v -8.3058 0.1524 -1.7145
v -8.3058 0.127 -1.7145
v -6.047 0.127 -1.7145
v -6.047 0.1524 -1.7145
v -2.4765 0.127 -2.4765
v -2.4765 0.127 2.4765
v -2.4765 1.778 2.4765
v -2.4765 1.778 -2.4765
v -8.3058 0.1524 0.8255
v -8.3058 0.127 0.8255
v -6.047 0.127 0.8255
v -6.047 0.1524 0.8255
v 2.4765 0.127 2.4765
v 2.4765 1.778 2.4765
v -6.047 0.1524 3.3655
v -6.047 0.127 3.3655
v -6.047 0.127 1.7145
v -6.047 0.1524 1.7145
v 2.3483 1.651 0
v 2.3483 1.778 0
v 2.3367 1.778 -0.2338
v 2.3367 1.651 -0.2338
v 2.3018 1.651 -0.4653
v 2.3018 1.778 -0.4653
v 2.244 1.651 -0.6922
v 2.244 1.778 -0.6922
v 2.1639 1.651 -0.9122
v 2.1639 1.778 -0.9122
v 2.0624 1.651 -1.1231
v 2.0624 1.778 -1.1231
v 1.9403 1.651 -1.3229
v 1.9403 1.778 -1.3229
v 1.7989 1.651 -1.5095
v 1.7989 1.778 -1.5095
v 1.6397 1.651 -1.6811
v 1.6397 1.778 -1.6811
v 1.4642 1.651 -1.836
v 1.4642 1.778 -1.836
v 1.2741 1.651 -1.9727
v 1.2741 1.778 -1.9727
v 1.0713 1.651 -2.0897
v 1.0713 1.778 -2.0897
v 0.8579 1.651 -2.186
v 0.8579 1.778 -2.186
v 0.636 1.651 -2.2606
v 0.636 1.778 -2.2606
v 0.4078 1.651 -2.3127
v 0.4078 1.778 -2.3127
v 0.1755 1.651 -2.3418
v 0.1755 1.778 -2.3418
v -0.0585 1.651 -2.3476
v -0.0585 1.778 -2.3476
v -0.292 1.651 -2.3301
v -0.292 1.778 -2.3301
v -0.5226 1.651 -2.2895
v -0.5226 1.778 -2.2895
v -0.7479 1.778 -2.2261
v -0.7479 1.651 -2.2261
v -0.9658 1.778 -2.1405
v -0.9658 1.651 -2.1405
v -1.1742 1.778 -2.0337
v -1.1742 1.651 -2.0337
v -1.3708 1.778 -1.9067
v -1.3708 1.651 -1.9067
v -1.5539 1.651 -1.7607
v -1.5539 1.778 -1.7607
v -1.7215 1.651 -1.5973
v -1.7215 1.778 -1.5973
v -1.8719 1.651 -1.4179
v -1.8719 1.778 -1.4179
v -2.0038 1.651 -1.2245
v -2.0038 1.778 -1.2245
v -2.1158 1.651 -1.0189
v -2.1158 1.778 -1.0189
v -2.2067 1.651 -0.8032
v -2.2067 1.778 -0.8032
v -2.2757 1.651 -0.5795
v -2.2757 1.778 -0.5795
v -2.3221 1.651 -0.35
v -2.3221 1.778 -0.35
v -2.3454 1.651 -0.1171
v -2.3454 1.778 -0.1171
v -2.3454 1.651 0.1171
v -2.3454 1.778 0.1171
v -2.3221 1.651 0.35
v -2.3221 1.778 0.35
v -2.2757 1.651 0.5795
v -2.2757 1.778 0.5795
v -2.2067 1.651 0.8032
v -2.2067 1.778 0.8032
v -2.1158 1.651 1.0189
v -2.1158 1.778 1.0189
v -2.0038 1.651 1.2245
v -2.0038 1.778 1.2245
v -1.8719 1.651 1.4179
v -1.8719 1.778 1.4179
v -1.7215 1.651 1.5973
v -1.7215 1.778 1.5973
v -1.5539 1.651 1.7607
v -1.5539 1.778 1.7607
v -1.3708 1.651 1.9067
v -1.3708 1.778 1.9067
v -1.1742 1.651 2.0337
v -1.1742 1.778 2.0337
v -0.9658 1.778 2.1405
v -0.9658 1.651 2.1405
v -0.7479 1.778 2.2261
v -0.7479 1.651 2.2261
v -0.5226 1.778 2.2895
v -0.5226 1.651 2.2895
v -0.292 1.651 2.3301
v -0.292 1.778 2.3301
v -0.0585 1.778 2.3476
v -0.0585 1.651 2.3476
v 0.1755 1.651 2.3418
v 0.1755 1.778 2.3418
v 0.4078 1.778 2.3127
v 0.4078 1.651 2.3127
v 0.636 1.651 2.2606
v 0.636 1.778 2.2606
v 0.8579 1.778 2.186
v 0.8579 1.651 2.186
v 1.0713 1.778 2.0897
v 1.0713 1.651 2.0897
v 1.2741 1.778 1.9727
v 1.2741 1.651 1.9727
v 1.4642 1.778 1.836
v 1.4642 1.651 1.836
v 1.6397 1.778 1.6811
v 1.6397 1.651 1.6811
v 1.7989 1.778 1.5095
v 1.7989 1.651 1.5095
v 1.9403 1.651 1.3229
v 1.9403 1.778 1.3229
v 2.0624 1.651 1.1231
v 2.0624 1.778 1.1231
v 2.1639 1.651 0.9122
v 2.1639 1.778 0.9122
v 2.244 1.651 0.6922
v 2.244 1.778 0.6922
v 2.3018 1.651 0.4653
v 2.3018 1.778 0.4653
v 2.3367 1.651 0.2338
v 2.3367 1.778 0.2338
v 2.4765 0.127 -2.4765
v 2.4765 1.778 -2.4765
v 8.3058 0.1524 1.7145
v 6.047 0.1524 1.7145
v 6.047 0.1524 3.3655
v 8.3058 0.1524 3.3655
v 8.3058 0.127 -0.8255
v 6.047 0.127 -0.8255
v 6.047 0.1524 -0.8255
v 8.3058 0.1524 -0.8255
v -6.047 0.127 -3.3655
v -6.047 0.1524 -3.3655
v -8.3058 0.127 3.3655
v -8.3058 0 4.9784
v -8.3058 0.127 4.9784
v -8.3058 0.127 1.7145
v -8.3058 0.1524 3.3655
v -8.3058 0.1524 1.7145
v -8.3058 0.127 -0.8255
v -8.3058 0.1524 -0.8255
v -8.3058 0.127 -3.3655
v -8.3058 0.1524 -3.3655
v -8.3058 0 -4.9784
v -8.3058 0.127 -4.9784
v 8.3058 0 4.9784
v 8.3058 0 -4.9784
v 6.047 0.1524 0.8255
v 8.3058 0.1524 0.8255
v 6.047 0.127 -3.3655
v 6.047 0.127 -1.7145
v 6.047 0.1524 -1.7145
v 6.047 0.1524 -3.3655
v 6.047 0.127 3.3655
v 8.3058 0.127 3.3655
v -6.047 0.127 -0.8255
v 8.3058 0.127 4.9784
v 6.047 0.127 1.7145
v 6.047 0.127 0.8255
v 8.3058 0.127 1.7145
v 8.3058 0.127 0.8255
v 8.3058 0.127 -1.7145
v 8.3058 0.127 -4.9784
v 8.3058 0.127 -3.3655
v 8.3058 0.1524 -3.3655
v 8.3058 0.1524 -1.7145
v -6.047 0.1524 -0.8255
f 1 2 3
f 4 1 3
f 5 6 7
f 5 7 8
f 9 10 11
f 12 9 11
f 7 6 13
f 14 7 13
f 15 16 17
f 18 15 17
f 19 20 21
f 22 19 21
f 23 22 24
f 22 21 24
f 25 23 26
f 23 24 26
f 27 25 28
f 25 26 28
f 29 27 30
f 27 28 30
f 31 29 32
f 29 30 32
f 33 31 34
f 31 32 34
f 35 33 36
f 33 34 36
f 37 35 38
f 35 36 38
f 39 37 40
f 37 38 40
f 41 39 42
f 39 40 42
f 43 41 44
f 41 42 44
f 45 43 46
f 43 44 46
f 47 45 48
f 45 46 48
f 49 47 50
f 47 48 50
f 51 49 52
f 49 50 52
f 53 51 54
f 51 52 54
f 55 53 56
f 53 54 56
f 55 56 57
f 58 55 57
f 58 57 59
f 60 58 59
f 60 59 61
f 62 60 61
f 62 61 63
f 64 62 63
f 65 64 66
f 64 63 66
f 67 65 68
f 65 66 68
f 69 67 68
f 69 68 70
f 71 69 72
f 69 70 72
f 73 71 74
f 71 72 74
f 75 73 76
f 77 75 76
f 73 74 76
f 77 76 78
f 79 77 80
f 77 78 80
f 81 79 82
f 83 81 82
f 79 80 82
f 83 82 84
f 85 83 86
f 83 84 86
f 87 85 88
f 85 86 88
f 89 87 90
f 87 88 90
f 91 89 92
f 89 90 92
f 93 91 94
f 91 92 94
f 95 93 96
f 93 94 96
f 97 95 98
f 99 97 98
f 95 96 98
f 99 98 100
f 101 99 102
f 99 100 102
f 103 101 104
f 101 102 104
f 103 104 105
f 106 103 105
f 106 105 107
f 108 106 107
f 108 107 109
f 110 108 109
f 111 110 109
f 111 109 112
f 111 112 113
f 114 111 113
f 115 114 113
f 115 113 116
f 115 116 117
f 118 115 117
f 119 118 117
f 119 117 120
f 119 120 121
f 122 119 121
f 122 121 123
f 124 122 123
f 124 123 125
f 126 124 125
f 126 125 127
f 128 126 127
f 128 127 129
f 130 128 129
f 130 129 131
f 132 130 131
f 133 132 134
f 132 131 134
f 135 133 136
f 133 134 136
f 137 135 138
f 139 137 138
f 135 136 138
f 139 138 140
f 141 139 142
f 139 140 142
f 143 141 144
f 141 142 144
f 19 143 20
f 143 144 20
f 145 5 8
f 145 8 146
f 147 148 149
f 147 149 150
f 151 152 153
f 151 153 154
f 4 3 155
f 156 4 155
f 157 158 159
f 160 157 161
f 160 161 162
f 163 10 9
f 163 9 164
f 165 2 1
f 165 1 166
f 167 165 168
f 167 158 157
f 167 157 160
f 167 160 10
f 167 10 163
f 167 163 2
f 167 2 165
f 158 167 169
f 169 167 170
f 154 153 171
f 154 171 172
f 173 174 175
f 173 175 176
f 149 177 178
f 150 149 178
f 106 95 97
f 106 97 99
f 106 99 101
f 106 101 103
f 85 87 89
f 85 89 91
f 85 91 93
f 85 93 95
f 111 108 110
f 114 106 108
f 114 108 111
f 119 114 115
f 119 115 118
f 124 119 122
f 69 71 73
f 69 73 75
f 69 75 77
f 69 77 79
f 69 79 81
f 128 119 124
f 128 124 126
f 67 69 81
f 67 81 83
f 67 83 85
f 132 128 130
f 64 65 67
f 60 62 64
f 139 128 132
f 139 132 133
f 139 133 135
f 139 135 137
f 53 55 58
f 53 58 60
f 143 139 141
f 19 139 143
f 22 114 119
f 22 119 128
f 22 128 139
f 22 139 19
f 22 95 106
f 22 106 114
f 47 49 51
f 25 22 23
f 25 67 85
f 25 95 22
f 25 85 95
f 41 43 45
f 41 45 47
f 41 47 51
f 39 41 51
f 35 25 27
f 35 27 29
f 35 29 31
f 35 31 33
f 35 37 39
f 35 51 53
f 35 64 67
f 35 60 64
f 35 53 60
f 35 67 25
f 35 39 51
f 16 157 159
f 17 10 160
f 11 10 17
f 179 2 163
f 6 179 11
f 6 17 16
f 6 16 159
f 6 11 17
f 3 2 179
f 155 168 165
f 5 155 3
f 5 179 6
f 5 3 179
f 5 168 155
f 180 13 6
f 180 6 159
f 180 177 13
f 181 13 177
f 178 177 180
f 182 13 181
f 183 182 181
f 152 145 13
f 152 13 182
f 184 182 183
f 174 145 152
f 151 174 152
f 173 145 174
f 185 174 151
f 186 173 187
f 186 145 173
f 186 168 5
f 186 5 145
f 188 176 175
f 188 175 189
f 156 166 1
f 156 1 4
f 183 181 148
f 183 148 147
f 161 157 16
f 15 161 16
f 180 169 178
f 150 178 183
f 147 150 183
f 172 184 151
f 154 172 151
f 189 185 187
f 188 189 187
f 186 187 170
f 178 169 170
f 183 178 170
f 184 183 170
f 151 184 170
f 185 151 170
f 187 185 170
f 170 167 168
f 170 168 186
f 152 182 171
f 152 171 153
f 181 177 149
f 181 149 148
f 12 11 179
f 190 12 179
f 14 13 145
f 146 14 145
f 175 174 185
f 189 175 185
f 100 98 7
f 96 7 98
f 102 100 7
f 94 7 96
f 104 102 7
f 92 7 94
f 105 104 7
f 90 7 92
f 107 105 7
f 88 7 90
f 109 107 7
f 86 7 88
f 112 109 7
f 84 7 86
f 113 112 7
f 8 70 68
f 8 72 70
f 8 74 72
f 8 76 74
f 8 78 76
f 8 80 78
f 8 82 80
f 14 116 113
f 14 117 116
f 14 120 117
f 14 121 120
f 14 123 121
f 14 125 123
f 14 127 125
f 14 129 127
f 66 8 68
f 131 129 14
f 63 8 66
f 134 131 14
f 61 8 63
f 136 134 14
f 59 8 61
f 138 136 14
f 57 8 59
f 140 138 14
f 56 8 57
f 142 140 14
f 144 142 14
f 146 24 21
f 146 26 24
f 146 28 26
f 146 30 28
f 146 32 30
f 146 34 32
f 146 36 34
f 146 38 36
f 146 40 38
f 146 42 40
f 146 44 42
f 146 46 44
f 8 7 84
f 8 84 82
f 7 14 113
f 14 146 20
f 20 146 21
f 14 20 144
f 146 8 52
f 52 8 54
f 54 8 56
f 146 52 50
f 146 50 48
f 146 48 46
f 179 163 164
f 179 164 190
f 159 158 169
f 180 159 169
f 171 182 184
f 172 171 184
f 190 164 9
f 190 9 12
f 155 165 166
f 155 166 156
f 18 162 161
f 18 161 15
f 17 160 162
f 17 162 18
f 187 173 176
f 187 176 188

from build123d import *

# Parameters (mm, degrees)
SKETCH1_W           = 16.6116
SKETCH1_H           = 9.9568
BOSS_EXTRUDE1_DEPTH = 0.127
SKETCH3_W           = 4.953
SKETCH3_H           = 4.953
BOSS_EXTRUDE3_DEPTH = 1.651
SKETCH4_W           = 2.258810151
SKETCH4_H           = 1.651
BOSS_EXTRUDE4_DEPTH = 0.0254
SKETCH5_R           = 2.348345572
CUT_EXTRUDE1_DEPTH  = 0.127


with BuildPart() as part:
    # Sketch1 → Boss-Extrude1 (new body)
    with BuildSketch(Plane(origin=(0, 0, 0), x_dir=(1, 0, 0), z_dir=(0, 1, 0))):
        Rectangle(SKETCH1_W, SKETCH1_H)
    extrude(amount=BOSS_EXTRUDE1_DEPTH)

    # Sketch3 → Boss-Extrude3 (add)
    with BuildSketch(Plane(origin=(0, 0.127, 0), x_dir=(1, 0, 0), z_dir=(0, 1, 0))):
        Rectangle(SKETCH3_W, SKETCH3_H)
    extrude(amount=BOSS_EXTRUDE3_DEPTH)

    # Sketch4 → Boss-Extrude4 (add)
    with BuildSketch(Plane(origin=(0, 0.127, 0), x_dir=(1, 0, 0), z_dir=(0, 1, 0))):
        with Locations((-7.176394925, 0)):
            Rectangle(SKETCH4_W, SKETCH4_H)
        with Locations((-7.176394925, 2.54)):
            Rectangle(SKETCH4_W, SKETCH4_H)
        with Locations((-7.176394925, -2.54)):
            Rectangle(SKETCH4_W, SKETCH4_H)
        with Locations((7.176394925, -2.54)):
            Rectangle(SKETCH4_W, SKETCH4_H)
        with Locations((7.176394925, 0)):
            Rectangle(SKETCH4_W, SKETCH4_H)
        with Locations((7.176394925, 2.54)):
            Rectangle(SKETCH4_W, SKETCH4_H)
    extrude(amount=BOSS_EXTRUDE4_DEPTH)

    # Sketch5 → Cut-Extrude1 (cut)
    with BuildSketch(Plane(origin=(0, 1.778, 0), x_dir=(1, 0, 0), z_dir=(0, 1, 0))):
        Circle(SKETCH5_R)
    extrude(amount=-CUT_EXTRUDE1_DEPTH, mode=Mode.SUBTRACT)


solid = part.part
